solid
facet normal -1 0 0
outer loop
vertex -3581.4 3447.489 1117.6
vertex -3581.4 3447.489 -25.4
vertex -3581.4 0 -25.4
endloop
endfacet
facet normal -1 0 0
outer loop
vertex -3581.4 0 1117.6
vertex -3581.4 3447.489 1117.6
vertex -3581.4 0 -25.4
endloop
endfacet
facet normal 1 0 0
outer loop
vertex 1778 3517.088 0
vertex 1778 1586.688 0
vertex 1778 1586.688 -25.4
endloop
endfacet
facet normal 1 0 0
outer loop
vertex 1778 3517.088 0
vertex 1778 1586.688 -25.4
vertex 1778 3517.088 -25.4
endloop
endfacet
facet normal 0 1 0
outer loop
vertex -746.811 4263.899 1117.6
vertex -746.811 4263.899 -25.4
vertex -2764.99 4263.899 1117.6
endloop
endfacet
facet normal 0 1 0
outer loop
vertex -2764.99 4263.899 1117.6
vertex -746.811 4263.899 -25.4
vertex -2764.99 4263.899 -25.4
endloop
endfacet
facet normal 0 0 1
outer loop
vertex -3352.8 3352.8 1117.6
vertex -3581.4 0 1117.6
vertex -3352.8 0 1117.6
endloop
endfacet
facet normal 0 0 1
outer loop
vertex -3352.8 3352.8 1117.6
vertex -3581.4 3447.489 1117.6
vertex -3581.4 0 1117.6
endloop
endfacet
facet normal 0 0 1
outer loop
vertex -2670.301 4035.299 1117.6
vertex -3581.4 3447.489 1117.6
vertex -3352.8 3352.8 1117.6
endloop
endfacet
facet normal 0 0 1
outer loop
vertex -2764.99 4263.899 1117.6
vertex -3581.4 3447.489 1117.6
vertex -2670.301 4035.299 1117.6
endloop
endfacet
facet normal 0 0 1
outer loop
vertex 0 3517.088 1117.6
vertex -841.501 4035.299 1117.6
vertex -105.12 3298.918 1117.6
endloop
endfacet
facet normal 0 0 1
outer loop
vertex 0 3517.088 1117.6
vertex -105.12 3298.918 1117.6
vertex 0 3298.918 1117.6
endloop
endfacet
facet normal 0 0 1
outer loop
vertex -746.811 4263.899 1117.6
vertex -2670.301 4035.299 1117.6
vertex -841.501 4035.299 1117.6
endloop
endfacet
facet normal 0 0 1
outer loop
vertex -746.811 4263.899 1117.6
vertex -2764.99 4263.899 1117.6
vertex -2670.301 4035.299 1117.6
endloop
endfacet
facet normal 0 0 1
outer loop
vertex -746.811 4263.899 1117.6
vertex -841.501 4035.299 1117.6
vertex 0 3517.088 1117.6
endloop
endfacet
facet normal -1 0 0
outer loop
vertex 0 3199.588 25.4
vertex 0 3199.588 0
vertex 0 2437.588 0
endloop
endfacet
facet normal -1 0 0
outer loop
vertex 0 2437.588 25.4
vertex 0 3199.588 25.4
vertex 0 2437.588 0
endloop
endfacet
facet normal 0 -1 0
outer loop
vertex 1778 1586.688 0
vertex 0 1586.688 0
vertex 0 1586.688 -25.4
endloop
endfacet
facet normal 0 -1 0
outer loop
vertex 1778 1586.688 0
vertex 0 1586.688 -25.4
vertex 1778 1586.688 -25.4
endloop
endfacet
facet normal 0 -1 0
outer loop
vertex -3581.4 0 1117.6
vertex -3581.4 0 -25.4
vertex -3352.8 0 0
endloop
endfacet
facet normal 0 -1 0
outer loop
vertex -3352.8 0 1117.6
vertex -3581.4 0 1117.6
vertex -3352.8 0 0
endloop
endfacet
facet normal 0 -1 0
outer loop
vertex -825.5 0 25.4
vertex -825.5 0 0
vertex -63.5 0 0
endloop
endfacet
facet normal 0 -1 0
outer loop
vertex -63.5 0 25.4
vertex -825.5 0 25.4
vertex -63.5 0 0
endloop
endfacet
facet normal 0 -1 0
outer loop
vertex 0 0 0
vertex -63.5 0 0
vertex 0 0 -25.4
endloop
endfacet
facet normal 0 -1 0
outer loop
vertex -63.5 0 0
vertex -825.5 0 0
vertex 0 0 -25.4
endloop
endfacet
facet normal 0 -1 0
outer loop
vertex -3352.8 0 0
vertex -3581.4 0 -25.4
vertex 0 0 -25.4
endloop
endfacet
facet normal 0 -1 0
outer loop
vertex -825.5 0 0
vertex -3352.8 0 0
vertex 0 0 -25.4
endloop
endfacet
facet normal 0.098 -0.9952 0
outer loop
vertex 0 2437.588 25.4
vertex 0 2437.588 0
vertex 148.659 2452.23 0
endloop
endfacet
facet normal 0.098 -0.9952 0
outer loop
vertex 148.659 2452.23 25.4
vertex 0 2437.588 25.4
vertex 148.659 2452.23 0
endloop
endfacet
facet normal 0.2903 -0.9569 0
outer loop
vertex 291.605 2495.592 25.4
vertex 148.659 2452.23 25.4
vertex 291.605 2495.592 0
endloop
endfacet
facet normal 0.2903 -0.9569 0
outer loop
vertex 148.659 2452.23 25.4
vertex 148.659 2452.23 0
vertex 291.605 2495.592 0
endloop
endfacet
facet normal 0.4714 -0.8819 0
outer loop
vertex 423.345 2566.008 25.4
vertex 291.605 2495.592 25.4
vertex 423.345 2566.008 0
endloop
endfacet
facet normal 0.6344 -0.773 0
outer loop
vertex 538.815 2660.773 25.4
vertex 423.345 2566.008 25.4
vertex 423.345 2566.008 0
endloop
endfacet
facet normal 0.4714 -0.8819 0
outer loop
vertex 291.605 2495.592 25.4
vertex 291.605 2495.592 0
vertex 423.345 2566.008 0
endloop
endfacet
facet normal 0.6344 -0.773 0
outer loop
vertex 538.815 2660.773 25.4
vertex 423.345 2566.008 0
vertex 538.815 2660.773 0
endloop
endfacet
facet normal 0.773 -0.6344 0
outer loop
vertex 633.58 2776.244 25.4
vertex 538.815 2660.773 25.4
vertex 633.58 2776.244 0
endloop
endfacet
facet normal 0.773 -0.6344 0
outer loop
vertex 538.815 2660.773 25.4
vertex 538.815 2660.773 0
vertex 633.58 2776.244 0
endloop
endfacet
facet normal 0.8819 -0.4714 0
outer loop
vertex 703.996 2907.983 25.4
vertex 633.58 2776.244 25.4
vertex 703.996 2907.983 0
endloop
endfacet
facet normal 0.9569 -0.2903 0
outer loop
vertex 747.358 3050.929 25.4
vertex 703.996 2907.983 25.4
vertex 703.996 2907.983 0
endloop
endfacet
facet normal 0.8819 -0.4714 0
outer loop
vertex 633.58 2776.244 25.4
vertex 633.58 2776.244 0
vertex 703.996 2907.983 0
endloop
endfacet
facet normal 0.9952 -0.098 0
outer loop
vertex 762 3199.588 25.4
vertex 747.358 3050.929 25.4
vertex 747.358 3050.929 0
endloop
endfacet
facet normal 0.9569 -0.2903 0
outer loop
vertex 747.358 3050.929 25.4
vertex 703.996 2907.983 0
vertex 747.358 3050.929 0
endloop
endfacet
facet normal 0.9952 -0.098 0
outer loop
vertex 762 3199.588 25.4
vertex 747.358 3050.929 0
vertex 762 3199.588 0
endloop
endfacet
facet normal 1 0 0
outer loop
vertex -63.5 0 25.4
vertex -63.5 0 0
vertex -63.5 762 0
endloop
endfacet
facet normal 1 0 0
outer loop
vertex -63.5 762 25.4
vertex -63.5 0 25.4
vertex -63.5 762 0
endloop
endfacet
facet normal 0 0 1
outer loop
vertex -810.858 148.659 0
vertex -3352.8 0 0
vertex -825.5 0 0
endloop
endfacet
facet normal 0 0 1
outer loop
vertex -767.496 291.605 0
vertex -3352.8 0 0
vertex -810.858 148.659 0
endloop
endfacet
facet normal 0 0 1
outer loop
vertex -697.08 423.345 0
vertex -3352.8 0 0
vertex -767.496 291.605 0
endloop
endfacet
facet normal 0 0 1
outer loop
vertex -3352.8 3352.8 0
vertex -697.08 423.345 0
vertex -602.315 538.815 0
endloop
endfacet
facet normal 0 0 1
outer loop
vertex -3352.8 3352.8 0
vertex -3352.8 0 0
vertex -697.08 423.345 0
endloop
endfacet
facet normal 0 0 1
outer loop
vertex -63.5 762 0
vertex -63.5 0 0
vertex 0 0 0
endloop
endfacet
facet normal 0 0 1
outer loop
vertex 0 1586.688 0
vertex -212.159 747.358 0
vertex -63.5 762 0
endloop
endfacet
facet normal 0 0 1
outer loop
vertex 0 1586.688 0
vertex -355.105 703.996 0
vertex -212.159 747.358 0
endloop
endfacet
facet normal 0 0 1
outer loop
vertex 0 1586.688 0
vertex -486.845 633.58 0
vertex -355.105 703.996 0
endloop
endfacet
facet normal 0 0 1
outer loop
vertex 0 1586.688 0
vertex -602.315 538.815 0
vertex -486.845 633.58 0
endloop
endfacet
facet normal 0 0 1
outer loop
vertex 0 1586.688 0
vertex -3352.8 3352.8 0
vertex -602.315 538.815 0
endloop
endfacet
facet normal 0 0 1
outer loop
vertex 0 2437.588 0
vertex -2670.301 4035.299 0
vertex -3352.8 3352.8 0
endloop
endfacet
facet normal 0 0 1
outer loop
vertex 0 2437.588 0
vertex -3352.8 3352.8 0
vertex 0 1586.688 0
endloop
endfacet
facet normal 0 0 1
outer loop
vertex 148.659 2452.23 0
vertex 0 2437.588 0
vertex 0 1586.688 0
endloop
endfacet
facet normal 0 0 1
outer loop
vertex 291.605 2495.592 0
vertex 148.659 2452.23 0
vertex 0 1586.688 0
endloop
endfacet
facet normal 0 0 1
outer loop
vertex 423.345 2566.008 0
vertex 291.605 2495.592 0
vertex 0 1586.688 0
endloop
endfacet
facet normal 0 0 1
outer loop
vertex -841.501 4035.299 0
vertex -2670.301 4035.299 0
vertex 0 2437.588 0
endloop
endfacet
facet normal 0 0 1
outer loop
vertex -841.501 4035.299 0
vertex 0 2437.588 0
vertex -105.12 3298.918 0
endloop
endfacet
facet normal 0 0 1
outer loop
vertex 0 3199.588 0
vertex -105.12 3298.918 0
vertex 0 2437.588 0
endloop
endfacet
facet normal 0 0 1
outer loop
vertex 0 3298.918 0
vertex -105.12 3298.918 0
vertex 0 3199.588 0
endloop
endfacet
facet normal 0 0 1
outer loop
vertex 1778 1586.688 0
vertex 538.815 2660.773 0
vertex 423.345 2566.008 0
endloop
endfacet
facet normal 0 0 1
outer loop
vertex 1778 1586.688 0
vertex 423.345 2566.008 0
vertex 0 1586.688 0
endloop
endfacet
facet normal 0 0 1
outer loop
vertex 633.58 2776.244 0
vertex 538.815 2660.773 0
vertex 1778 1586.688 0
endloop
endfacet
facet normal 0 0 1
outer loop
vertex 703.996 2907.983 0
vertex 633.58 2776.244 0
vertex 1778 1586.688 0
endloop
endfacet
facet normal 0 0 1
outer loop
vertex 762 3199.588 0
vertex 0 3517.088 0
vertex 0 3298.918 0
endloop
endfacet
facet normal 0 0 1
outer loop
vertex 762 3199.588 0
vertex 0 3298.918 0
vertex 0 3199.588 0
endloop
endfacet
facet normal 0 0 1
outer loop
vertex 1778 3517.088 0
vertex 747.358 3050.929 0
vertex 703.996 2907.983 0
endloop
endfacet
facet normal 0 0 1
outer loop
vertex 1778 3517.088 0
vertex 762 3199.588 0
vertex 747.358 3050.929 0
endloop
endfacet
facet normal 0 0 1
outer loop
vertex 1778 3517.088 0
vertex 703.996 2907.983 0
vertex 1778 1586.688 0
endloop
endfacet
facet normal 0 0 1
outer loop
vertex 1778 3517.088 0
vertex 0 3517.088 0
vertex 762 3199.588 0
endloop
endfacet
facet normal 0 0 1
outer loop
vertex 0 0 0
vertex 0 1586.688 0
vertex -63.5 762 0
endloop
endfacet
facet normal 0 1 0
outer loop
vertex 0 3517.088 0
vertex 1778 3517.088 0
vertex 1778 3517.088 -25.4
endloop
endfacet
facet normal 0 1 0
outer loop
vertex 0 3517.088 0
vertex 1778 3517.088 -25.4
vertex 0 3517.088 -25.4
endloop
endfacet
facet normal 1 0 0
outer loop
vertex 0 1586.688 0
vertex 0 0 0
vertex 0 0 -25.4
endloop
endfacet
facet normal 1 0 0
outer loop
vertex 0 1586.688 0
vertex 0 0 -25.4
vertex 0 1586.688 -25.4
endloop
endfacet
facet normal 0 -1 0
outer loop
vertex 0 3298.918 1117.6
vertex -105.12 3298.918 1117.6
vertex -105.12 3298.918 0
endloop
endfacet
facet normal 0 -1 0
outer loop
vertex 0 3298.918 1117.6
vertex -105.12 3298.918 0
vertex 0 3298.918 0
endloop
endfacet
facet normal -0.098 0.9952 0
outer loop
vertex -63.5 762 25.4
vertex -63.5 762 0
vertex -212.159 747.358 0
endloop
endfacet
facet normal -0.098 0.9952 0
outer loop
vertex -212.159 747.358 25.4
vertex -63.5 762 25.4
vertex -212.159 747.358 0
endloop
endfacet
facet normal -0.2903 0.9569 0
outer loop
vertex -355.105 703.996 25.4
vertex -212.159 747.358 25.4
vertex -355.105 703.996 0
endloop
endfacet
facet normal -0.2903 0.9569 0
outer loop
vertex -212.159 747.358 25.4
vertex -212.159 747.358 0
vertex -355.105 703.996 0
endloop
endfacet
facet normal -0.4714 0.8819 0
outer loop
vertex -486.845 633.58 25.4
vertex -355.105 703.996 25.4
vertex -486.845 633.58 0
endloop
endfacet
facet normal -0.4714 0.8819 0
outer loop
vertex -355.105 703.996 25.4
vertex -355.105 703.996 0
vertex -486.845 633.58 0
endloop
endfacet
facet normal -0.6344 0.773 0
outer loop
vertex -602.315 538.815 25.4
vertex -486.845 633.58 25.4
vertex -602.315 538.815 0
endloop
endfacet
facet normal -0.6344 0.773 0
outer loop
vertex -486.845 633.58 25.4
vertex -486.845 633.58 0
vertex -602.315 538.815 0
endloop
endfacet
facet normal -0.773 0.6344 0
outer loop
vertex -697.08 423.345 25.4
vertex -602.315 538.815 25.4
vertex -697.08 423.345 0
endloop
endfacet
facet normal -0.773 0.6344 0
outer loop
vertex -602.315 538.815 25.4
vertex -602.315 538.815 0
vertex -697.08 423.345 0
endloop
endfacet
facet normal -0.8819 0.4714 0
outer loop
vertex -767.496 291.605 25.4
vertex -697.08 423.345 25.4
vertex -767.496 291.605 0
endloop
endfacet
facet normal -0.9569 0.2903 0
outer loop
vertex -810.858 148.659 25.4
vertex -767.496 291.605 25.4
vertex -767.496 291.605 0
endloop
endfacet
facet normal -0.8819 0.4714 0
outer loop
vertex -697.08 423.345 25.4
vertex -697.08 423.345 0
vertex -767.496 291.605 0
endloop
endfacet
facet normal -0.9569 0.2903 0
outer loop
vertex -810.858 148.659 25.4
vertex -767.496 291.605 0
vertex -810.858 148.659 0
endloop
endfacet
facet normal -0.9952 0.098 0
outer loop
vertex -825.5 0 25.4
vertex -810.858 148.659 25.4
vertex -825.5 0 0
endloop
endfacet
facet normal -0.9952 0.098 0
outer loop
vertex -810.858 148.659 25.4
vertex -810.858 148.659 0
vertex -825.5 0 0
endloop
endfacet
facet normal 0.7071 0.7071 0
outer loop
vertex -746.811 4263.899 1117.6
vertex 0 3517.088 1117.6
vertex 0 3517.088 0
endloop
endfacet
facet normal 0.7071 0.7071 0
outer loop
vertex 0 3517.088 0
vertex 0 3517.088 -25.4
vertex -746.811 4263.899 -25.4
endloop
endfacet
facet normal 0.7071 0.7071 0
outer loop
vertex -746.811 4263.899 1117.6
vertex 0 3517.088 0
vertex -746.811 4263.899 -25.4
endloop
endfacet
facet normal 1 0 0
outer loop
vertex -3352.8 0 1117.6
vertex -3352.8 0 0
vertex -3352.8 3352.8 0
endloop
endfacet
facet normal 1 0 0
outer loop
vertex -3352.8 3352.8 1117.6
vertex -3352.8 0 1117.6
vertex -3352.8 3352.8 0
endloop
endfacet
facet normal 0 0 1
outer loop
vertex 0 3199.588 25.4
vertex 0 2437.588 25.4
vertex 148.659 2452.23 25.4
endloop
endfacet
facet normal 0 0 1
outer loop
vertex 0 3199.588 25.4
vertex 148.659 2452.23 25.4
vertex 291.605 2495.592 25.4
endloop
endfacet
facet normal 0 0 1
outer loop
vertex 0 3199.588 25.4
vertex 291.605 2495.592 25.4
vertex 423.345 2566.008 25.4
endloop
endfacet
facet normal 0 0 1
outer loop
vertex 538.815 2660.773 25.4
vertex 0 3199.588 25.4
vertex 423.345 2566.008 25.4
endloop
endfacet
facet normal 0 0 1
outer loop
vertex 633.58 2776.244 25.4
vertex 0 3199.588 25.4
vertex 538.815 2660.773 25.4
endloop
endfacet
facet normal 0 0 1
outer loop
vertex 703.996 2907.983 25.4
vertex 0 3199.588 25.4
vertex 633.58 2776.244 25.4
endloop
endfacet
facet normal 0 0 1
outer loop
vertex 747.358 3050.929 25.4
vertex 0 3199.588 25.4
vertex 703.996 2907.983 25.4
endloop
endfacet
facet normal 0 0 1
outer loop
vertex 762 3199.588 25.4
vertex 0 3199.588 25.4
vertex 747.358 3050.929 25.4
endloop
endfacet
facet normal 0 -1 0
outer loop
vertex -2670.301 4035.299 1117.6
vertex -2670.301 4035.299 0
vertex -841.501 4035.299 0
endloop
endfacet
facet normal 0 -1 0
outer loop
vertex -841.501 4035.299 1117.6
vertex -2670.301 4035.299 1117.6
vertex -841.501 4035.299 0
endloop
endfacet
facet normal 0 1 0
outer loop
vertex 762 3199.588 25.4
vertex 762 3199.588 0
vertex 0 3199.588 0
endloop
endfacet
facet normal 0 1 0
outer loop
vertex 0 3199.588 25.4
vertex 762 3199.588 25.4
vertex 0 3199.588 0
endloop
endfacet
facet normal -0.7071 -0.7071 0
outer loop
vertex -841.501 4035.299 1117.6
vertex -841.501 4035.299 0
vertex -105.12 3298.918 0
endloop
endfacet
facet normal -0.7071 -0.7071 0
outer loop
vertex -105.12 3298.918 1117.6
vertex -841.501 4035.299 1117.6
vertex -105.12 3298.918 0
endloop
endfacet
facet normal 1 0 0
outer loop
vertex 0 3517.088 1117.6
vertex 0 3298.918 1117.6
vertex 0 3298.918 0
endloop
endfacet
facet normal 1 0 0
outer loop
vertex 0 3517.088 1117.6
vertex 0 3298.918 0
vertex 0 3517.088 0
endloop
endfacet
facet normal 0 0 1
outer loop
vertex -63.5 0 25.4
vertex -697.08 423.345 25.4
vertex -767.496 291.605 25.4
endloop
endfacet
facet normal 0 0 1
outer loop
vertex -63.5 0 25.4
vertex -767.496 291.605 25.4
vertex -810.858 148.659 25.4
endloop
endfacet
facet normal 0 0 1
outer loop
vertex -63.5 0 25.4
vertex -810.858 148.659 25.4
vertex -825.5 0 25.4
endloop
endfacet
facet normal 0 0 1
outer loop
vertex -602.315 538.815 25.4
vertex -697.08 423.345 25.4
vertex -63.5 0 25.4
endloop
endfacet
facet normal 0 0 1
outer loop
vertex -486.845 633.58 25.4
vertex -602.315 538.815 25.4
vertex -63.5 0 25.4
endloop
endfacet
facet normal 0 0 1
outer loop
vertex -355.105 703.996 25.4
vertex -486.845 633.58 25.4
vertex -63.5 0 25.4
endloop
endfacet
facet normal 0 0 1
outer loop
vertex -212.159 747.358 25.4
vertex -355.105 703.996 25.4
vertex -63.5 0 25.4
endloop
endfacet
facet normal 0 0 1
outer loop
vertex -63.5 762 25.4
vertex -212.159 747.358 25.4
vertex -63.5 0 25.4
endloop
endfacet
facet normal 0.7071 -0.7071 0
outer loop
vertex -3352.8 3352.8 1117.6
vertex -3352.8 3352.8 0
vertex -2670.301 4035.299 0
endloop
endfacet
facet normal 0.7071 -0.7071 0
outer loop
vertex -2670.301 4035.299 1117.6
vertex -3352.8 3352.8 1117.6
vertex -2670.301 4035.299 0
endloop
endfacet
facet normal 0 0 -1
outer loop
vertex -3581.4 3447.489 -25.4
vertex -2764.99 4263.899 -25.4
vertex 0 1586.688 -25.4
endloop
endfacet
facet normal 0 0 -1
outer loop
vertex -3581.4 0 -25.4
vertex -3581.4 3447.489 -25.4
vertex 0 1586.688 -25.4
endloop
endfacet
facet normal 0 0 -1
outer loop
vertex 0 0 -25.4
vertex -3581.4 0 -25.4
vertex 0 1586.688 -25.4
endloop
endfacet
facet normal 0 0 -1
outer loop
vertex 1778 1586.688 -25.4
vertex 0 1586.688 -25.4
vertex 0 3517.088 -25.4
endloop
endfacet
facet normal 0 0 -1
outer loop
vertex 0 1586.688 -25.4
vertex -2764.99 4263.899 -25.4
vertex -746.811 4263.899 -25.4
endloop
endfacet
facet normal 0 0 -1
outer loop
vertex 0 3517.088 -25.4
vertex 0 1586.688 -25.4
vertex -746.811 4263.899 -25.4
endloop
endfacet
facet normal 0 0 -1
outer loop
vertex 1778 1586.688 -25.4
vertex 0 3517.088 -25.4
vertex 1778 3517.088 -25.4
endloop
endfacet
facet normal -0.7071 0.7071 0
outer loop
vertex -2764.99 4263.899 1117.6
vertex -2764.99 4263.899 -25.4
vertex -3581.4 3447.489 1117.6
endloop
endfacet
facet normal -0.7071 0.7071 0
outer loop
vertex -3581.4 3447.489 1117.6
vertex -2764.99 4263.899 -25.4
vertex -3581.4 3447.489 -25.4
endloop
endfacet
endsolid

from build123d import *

# Parameters (mm, degrees)
F1_DEPTH = 25.4
F2_DEPTH = 25.4
F3_DEPTH = 1117.6


# Not quite as in the source:
# - the program builds the solid bodies; features that only make, move or delete a surface that nothing else refers to are left out


with BuildPart() as f1:
    # F0 (on Top) → F1 (new body)
    with BuildSketch(Plane.XY):
        with BuildLine():
            Line((-63.5, 0), (0, 0))
            Line((0, 0), (0, 1586.688150761))
            Line((0, 1586.688150761), (0, 2437.588150761))
            Line((0, 2437.588150761), (0, 3199.588150761))
            Line((0, 3199.588150761), (0, 3298.9184632736))
            Line((0, 3298.9184632736), (-105.1195328711, 3298.9184632736))
            Line((-105.1195328711, 3298.9184632736), (-841.5005347987, 4035.2994652013))
            Line((-841.5005347987, 4035.2994652013), (-2670.3005347987, 4035.2994652013))
            Line((-2670.3005347987, 4035.2994652013), (-3352.8, 3352.8))
            Line((-3352.8, 3352.8), (-3352.8, 0))
            Line((-3352.8, 0), (-825.5, 0))
            ThreePointArc((-825.5, 0), (-602.3153672642, 538.8153672642), (-63.5, 762))
            Line((-63.5, 762), (-63.5, 0))
        make_face()
        with BuildLine():
            Line((-825.5, 0), (-63.5, 0))
            Line((-63.5, 0), (-63.5, 762))
            ThreePointArc((-63.5, 762), (-602.3153672642, 538.8153672642), (-825.5, 0))
        make_face()
        with BuildLine():
            Line((0, 2437.588150761), (0, 1586.688150761))
            Line((0, 1586.688150761), (1778, 1586.688150761))
            Line((1778, 1586.688150761), (1778, 3517.088150761))
            Line((1778, 3517.088150761), (0, 3517.088150761))
            Line((0, 3517.088150761), (0, 3298.9184632736))
            Line((0, 3298.9184632736), (0, 3199.588150761))
            Line((0, 3199.588150761), (762, 3199.588150761))
            ThreePointArc((762, 3199.588150761), (538.8153672641, 2660.7727834969), (0, 2437.588150761))
        make_face()
        Polygon((-3581.4, 0), (-3352.8, 0), (-3352.8, 3352.8), (-2670.3005347987, 4035.2994652013), (-841.5005347987, 4035.2994652013), (-105.1195328711, 3298.9184632736), (0, 3298.9184632736), (0, 3517.088150761), (-746.8113144403, 4263.8994652013), (-2764.9897551572, 4263.8994652013), (-3581.4, 3447.4892203585), align=None)
        with BuildLine():
            Line((0, 3199.588150761), (0, 2437.588150761))
            ThreePointArc((0, 2437.588150761), (538.8153672641, 2660.7727834969), (762, 3199.588150761))
            Line((762, 3199.588150761), (0, 3199.588150761))
        make_face()
    extrude(amount=-F1_DEPTH)

    # F0 (on Top) → F2 (join)
    with BuildSketch(Plane.XY):
        with BuildLine():
            Line((0, 3199.588150761), (0, 2437.588150761))
            ThreePointArc((0, 2437.588150761), (538.8153672641, 2660.7727834969), (762, 3199.588150761))
            Line((762, 3199.588150761), (0, 3199.588150761))
        make_face()
        with BuildLine():
            Line((-825.5, 0), (-63.5, 0))
            Line((-63.5, 0), (-63.5, 762))
            ThreePointArc((-63.5, 762), (-602.3153672642, 538.8153672642), (-825.5, 0))
        make_face()
    extrude(amount=F2_DEPTH)

    # F0 (on Top) → F3 (join)
    with BuildSketch(Plane.XY):
        Polygon((-3581.4, 0), (-3352.8, 0), (-3352.8, 3352.8), (-2670.3005347987, 4035.2994652013), (-841.5005347987, 4035.2994652013), (-105.1195328711, 3298.9184632736), (0, 3298.9184632736), (0, 3517.088150761), (-746.8113144403, 4263.8994652013), (-2764.9897551572, 4263.8994652013), (-3581.4, 3447.4892203585), align=None)
    extrude(amount=F3_DEPTH)


solid = f1.part
